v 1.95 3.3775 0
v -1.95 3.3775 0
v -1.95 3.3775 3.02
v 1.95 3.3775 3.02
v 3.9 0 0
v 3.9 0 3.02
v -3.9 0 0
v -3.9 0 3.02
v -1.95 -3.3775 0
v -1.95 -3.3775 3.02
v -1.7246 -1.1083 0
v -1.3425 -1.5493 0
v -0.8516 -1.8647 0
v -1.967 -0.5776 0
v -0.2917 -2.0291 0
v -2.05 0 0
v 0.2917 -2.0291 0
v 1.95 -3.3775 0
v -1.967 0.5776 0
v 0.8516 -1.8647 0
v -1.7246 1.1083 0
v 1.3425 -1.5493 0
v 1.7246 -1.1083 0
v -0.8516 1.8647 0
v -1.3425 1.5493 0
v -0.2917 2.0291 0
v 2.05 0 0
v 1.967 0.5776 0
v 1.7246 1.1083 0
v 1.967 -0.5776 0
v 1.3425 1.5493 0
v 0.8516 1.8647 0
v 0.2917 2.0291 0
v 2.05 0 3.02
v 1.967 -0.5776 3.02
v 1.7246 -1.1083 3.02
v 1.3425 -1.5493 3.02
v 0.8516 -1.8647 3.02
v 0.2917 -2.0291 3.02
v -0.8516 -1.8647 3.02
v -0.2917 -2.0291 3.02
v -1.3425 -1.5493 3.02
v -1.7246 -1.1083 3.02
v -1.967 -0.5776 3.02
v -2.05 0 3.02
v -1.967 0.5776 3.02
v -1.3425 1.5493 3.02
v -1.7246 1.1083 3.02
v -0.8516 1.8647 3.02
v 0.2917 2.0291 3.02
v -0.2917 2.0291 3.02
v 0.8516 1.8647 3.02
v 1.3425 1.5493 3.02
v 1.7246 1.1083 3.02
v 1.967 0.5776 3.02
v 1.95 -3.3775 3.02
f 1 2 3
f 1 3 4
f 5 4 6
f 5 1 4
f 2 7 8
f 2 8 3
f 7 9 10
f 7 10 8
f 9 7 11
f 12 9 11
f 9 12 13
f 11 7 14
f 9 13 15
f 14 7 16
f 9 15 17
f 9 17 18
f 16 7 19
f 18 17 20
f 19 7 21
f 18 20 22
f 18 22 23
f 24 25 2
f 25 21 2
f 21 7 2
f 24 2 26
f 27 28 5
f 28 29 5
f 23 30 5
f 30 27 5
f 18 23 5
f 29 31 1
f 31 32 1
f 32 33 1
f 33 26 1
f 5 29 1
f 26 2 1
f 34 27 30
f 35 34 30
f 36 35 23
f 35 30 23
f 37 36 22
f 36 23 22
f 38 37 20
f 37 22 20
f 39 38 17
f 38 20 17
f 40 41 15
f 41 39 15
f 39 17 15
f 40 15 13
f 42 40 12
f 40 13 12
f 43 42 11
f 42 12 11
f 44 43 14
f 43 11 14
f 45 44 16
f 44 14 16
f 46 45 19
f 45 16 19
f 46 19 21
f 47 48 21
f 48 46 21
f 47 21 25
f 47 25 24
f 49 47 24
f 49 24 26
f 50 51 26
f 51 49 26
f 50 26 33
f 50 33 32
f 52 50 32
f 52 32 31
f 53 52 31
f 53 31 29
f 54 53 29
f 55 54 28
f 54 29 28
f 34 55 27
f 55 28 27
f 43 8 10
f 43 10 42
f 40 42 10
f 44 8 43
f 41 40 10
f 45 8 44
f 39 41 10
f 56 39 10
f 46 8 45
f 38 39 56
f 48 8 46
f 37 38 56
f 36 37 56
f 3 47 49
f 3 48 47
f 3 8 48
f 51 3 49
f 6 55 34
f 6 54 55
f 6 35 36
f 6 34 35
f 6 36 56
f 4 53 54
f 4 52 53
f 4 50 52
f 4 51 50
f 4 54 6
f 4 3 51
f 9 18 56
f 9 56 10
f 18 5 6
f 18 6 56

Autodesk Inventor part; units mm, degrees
ref_plane "YZ Plane" through (0, 0, 0) normal (1, 0, 0) x (0, 1, 0)
ref_plane "XZ Plane" through (0, 0, 0) normal (0, 1, 0) x (-1, 0, 0)
ref_plane "XY Plane" through (0, 0, 0) normal (0, 0, 1) x (1, 0, 0)
sketch "Sketch1" plane through (0, 0, 0) normal (0, 0, 1) x (1, 0, 0)
  line L0 (0, 0) -> (3.9, 0) construction
  line L1 (0, 0) -> (1.95, 3.3775) construction
  line L2 (0, 0) -> (-1.95, 3.3775) construction
  line L3 (0, 0) -> (-3.9, 0) construction
  line L4 (0, 0) -> (-1.95, -3.3775) construction
  line L5 (0, 0) -> (1.95, -3.3775) construction
  line L6 (-1.95, 3.3775) -> (1.95, 3.3775)
  line L7 (1.95, 3.3775) -> (3.9, 0)
  line L8 (3.9, 0) -> (1.95, -3.3775)
  line L9 (1.95, -3.3775) -> (-1.95, -3.3775)
  line L10 (-1.95, -3.3775) -> (-3.9, 0)
  line L11 (-3.9, 0) -> (-1.95, 3.3775)
  circle A0 centre (0, 0) radius 2.05
  dimension "d0" = 3.9
  dimension "d3" = 360
  dimension "d5" = 4.1
extrude "Extrusion1" add sketch "Sketch1" along normal blind 3.02
properties part number "M4_tuerca"
